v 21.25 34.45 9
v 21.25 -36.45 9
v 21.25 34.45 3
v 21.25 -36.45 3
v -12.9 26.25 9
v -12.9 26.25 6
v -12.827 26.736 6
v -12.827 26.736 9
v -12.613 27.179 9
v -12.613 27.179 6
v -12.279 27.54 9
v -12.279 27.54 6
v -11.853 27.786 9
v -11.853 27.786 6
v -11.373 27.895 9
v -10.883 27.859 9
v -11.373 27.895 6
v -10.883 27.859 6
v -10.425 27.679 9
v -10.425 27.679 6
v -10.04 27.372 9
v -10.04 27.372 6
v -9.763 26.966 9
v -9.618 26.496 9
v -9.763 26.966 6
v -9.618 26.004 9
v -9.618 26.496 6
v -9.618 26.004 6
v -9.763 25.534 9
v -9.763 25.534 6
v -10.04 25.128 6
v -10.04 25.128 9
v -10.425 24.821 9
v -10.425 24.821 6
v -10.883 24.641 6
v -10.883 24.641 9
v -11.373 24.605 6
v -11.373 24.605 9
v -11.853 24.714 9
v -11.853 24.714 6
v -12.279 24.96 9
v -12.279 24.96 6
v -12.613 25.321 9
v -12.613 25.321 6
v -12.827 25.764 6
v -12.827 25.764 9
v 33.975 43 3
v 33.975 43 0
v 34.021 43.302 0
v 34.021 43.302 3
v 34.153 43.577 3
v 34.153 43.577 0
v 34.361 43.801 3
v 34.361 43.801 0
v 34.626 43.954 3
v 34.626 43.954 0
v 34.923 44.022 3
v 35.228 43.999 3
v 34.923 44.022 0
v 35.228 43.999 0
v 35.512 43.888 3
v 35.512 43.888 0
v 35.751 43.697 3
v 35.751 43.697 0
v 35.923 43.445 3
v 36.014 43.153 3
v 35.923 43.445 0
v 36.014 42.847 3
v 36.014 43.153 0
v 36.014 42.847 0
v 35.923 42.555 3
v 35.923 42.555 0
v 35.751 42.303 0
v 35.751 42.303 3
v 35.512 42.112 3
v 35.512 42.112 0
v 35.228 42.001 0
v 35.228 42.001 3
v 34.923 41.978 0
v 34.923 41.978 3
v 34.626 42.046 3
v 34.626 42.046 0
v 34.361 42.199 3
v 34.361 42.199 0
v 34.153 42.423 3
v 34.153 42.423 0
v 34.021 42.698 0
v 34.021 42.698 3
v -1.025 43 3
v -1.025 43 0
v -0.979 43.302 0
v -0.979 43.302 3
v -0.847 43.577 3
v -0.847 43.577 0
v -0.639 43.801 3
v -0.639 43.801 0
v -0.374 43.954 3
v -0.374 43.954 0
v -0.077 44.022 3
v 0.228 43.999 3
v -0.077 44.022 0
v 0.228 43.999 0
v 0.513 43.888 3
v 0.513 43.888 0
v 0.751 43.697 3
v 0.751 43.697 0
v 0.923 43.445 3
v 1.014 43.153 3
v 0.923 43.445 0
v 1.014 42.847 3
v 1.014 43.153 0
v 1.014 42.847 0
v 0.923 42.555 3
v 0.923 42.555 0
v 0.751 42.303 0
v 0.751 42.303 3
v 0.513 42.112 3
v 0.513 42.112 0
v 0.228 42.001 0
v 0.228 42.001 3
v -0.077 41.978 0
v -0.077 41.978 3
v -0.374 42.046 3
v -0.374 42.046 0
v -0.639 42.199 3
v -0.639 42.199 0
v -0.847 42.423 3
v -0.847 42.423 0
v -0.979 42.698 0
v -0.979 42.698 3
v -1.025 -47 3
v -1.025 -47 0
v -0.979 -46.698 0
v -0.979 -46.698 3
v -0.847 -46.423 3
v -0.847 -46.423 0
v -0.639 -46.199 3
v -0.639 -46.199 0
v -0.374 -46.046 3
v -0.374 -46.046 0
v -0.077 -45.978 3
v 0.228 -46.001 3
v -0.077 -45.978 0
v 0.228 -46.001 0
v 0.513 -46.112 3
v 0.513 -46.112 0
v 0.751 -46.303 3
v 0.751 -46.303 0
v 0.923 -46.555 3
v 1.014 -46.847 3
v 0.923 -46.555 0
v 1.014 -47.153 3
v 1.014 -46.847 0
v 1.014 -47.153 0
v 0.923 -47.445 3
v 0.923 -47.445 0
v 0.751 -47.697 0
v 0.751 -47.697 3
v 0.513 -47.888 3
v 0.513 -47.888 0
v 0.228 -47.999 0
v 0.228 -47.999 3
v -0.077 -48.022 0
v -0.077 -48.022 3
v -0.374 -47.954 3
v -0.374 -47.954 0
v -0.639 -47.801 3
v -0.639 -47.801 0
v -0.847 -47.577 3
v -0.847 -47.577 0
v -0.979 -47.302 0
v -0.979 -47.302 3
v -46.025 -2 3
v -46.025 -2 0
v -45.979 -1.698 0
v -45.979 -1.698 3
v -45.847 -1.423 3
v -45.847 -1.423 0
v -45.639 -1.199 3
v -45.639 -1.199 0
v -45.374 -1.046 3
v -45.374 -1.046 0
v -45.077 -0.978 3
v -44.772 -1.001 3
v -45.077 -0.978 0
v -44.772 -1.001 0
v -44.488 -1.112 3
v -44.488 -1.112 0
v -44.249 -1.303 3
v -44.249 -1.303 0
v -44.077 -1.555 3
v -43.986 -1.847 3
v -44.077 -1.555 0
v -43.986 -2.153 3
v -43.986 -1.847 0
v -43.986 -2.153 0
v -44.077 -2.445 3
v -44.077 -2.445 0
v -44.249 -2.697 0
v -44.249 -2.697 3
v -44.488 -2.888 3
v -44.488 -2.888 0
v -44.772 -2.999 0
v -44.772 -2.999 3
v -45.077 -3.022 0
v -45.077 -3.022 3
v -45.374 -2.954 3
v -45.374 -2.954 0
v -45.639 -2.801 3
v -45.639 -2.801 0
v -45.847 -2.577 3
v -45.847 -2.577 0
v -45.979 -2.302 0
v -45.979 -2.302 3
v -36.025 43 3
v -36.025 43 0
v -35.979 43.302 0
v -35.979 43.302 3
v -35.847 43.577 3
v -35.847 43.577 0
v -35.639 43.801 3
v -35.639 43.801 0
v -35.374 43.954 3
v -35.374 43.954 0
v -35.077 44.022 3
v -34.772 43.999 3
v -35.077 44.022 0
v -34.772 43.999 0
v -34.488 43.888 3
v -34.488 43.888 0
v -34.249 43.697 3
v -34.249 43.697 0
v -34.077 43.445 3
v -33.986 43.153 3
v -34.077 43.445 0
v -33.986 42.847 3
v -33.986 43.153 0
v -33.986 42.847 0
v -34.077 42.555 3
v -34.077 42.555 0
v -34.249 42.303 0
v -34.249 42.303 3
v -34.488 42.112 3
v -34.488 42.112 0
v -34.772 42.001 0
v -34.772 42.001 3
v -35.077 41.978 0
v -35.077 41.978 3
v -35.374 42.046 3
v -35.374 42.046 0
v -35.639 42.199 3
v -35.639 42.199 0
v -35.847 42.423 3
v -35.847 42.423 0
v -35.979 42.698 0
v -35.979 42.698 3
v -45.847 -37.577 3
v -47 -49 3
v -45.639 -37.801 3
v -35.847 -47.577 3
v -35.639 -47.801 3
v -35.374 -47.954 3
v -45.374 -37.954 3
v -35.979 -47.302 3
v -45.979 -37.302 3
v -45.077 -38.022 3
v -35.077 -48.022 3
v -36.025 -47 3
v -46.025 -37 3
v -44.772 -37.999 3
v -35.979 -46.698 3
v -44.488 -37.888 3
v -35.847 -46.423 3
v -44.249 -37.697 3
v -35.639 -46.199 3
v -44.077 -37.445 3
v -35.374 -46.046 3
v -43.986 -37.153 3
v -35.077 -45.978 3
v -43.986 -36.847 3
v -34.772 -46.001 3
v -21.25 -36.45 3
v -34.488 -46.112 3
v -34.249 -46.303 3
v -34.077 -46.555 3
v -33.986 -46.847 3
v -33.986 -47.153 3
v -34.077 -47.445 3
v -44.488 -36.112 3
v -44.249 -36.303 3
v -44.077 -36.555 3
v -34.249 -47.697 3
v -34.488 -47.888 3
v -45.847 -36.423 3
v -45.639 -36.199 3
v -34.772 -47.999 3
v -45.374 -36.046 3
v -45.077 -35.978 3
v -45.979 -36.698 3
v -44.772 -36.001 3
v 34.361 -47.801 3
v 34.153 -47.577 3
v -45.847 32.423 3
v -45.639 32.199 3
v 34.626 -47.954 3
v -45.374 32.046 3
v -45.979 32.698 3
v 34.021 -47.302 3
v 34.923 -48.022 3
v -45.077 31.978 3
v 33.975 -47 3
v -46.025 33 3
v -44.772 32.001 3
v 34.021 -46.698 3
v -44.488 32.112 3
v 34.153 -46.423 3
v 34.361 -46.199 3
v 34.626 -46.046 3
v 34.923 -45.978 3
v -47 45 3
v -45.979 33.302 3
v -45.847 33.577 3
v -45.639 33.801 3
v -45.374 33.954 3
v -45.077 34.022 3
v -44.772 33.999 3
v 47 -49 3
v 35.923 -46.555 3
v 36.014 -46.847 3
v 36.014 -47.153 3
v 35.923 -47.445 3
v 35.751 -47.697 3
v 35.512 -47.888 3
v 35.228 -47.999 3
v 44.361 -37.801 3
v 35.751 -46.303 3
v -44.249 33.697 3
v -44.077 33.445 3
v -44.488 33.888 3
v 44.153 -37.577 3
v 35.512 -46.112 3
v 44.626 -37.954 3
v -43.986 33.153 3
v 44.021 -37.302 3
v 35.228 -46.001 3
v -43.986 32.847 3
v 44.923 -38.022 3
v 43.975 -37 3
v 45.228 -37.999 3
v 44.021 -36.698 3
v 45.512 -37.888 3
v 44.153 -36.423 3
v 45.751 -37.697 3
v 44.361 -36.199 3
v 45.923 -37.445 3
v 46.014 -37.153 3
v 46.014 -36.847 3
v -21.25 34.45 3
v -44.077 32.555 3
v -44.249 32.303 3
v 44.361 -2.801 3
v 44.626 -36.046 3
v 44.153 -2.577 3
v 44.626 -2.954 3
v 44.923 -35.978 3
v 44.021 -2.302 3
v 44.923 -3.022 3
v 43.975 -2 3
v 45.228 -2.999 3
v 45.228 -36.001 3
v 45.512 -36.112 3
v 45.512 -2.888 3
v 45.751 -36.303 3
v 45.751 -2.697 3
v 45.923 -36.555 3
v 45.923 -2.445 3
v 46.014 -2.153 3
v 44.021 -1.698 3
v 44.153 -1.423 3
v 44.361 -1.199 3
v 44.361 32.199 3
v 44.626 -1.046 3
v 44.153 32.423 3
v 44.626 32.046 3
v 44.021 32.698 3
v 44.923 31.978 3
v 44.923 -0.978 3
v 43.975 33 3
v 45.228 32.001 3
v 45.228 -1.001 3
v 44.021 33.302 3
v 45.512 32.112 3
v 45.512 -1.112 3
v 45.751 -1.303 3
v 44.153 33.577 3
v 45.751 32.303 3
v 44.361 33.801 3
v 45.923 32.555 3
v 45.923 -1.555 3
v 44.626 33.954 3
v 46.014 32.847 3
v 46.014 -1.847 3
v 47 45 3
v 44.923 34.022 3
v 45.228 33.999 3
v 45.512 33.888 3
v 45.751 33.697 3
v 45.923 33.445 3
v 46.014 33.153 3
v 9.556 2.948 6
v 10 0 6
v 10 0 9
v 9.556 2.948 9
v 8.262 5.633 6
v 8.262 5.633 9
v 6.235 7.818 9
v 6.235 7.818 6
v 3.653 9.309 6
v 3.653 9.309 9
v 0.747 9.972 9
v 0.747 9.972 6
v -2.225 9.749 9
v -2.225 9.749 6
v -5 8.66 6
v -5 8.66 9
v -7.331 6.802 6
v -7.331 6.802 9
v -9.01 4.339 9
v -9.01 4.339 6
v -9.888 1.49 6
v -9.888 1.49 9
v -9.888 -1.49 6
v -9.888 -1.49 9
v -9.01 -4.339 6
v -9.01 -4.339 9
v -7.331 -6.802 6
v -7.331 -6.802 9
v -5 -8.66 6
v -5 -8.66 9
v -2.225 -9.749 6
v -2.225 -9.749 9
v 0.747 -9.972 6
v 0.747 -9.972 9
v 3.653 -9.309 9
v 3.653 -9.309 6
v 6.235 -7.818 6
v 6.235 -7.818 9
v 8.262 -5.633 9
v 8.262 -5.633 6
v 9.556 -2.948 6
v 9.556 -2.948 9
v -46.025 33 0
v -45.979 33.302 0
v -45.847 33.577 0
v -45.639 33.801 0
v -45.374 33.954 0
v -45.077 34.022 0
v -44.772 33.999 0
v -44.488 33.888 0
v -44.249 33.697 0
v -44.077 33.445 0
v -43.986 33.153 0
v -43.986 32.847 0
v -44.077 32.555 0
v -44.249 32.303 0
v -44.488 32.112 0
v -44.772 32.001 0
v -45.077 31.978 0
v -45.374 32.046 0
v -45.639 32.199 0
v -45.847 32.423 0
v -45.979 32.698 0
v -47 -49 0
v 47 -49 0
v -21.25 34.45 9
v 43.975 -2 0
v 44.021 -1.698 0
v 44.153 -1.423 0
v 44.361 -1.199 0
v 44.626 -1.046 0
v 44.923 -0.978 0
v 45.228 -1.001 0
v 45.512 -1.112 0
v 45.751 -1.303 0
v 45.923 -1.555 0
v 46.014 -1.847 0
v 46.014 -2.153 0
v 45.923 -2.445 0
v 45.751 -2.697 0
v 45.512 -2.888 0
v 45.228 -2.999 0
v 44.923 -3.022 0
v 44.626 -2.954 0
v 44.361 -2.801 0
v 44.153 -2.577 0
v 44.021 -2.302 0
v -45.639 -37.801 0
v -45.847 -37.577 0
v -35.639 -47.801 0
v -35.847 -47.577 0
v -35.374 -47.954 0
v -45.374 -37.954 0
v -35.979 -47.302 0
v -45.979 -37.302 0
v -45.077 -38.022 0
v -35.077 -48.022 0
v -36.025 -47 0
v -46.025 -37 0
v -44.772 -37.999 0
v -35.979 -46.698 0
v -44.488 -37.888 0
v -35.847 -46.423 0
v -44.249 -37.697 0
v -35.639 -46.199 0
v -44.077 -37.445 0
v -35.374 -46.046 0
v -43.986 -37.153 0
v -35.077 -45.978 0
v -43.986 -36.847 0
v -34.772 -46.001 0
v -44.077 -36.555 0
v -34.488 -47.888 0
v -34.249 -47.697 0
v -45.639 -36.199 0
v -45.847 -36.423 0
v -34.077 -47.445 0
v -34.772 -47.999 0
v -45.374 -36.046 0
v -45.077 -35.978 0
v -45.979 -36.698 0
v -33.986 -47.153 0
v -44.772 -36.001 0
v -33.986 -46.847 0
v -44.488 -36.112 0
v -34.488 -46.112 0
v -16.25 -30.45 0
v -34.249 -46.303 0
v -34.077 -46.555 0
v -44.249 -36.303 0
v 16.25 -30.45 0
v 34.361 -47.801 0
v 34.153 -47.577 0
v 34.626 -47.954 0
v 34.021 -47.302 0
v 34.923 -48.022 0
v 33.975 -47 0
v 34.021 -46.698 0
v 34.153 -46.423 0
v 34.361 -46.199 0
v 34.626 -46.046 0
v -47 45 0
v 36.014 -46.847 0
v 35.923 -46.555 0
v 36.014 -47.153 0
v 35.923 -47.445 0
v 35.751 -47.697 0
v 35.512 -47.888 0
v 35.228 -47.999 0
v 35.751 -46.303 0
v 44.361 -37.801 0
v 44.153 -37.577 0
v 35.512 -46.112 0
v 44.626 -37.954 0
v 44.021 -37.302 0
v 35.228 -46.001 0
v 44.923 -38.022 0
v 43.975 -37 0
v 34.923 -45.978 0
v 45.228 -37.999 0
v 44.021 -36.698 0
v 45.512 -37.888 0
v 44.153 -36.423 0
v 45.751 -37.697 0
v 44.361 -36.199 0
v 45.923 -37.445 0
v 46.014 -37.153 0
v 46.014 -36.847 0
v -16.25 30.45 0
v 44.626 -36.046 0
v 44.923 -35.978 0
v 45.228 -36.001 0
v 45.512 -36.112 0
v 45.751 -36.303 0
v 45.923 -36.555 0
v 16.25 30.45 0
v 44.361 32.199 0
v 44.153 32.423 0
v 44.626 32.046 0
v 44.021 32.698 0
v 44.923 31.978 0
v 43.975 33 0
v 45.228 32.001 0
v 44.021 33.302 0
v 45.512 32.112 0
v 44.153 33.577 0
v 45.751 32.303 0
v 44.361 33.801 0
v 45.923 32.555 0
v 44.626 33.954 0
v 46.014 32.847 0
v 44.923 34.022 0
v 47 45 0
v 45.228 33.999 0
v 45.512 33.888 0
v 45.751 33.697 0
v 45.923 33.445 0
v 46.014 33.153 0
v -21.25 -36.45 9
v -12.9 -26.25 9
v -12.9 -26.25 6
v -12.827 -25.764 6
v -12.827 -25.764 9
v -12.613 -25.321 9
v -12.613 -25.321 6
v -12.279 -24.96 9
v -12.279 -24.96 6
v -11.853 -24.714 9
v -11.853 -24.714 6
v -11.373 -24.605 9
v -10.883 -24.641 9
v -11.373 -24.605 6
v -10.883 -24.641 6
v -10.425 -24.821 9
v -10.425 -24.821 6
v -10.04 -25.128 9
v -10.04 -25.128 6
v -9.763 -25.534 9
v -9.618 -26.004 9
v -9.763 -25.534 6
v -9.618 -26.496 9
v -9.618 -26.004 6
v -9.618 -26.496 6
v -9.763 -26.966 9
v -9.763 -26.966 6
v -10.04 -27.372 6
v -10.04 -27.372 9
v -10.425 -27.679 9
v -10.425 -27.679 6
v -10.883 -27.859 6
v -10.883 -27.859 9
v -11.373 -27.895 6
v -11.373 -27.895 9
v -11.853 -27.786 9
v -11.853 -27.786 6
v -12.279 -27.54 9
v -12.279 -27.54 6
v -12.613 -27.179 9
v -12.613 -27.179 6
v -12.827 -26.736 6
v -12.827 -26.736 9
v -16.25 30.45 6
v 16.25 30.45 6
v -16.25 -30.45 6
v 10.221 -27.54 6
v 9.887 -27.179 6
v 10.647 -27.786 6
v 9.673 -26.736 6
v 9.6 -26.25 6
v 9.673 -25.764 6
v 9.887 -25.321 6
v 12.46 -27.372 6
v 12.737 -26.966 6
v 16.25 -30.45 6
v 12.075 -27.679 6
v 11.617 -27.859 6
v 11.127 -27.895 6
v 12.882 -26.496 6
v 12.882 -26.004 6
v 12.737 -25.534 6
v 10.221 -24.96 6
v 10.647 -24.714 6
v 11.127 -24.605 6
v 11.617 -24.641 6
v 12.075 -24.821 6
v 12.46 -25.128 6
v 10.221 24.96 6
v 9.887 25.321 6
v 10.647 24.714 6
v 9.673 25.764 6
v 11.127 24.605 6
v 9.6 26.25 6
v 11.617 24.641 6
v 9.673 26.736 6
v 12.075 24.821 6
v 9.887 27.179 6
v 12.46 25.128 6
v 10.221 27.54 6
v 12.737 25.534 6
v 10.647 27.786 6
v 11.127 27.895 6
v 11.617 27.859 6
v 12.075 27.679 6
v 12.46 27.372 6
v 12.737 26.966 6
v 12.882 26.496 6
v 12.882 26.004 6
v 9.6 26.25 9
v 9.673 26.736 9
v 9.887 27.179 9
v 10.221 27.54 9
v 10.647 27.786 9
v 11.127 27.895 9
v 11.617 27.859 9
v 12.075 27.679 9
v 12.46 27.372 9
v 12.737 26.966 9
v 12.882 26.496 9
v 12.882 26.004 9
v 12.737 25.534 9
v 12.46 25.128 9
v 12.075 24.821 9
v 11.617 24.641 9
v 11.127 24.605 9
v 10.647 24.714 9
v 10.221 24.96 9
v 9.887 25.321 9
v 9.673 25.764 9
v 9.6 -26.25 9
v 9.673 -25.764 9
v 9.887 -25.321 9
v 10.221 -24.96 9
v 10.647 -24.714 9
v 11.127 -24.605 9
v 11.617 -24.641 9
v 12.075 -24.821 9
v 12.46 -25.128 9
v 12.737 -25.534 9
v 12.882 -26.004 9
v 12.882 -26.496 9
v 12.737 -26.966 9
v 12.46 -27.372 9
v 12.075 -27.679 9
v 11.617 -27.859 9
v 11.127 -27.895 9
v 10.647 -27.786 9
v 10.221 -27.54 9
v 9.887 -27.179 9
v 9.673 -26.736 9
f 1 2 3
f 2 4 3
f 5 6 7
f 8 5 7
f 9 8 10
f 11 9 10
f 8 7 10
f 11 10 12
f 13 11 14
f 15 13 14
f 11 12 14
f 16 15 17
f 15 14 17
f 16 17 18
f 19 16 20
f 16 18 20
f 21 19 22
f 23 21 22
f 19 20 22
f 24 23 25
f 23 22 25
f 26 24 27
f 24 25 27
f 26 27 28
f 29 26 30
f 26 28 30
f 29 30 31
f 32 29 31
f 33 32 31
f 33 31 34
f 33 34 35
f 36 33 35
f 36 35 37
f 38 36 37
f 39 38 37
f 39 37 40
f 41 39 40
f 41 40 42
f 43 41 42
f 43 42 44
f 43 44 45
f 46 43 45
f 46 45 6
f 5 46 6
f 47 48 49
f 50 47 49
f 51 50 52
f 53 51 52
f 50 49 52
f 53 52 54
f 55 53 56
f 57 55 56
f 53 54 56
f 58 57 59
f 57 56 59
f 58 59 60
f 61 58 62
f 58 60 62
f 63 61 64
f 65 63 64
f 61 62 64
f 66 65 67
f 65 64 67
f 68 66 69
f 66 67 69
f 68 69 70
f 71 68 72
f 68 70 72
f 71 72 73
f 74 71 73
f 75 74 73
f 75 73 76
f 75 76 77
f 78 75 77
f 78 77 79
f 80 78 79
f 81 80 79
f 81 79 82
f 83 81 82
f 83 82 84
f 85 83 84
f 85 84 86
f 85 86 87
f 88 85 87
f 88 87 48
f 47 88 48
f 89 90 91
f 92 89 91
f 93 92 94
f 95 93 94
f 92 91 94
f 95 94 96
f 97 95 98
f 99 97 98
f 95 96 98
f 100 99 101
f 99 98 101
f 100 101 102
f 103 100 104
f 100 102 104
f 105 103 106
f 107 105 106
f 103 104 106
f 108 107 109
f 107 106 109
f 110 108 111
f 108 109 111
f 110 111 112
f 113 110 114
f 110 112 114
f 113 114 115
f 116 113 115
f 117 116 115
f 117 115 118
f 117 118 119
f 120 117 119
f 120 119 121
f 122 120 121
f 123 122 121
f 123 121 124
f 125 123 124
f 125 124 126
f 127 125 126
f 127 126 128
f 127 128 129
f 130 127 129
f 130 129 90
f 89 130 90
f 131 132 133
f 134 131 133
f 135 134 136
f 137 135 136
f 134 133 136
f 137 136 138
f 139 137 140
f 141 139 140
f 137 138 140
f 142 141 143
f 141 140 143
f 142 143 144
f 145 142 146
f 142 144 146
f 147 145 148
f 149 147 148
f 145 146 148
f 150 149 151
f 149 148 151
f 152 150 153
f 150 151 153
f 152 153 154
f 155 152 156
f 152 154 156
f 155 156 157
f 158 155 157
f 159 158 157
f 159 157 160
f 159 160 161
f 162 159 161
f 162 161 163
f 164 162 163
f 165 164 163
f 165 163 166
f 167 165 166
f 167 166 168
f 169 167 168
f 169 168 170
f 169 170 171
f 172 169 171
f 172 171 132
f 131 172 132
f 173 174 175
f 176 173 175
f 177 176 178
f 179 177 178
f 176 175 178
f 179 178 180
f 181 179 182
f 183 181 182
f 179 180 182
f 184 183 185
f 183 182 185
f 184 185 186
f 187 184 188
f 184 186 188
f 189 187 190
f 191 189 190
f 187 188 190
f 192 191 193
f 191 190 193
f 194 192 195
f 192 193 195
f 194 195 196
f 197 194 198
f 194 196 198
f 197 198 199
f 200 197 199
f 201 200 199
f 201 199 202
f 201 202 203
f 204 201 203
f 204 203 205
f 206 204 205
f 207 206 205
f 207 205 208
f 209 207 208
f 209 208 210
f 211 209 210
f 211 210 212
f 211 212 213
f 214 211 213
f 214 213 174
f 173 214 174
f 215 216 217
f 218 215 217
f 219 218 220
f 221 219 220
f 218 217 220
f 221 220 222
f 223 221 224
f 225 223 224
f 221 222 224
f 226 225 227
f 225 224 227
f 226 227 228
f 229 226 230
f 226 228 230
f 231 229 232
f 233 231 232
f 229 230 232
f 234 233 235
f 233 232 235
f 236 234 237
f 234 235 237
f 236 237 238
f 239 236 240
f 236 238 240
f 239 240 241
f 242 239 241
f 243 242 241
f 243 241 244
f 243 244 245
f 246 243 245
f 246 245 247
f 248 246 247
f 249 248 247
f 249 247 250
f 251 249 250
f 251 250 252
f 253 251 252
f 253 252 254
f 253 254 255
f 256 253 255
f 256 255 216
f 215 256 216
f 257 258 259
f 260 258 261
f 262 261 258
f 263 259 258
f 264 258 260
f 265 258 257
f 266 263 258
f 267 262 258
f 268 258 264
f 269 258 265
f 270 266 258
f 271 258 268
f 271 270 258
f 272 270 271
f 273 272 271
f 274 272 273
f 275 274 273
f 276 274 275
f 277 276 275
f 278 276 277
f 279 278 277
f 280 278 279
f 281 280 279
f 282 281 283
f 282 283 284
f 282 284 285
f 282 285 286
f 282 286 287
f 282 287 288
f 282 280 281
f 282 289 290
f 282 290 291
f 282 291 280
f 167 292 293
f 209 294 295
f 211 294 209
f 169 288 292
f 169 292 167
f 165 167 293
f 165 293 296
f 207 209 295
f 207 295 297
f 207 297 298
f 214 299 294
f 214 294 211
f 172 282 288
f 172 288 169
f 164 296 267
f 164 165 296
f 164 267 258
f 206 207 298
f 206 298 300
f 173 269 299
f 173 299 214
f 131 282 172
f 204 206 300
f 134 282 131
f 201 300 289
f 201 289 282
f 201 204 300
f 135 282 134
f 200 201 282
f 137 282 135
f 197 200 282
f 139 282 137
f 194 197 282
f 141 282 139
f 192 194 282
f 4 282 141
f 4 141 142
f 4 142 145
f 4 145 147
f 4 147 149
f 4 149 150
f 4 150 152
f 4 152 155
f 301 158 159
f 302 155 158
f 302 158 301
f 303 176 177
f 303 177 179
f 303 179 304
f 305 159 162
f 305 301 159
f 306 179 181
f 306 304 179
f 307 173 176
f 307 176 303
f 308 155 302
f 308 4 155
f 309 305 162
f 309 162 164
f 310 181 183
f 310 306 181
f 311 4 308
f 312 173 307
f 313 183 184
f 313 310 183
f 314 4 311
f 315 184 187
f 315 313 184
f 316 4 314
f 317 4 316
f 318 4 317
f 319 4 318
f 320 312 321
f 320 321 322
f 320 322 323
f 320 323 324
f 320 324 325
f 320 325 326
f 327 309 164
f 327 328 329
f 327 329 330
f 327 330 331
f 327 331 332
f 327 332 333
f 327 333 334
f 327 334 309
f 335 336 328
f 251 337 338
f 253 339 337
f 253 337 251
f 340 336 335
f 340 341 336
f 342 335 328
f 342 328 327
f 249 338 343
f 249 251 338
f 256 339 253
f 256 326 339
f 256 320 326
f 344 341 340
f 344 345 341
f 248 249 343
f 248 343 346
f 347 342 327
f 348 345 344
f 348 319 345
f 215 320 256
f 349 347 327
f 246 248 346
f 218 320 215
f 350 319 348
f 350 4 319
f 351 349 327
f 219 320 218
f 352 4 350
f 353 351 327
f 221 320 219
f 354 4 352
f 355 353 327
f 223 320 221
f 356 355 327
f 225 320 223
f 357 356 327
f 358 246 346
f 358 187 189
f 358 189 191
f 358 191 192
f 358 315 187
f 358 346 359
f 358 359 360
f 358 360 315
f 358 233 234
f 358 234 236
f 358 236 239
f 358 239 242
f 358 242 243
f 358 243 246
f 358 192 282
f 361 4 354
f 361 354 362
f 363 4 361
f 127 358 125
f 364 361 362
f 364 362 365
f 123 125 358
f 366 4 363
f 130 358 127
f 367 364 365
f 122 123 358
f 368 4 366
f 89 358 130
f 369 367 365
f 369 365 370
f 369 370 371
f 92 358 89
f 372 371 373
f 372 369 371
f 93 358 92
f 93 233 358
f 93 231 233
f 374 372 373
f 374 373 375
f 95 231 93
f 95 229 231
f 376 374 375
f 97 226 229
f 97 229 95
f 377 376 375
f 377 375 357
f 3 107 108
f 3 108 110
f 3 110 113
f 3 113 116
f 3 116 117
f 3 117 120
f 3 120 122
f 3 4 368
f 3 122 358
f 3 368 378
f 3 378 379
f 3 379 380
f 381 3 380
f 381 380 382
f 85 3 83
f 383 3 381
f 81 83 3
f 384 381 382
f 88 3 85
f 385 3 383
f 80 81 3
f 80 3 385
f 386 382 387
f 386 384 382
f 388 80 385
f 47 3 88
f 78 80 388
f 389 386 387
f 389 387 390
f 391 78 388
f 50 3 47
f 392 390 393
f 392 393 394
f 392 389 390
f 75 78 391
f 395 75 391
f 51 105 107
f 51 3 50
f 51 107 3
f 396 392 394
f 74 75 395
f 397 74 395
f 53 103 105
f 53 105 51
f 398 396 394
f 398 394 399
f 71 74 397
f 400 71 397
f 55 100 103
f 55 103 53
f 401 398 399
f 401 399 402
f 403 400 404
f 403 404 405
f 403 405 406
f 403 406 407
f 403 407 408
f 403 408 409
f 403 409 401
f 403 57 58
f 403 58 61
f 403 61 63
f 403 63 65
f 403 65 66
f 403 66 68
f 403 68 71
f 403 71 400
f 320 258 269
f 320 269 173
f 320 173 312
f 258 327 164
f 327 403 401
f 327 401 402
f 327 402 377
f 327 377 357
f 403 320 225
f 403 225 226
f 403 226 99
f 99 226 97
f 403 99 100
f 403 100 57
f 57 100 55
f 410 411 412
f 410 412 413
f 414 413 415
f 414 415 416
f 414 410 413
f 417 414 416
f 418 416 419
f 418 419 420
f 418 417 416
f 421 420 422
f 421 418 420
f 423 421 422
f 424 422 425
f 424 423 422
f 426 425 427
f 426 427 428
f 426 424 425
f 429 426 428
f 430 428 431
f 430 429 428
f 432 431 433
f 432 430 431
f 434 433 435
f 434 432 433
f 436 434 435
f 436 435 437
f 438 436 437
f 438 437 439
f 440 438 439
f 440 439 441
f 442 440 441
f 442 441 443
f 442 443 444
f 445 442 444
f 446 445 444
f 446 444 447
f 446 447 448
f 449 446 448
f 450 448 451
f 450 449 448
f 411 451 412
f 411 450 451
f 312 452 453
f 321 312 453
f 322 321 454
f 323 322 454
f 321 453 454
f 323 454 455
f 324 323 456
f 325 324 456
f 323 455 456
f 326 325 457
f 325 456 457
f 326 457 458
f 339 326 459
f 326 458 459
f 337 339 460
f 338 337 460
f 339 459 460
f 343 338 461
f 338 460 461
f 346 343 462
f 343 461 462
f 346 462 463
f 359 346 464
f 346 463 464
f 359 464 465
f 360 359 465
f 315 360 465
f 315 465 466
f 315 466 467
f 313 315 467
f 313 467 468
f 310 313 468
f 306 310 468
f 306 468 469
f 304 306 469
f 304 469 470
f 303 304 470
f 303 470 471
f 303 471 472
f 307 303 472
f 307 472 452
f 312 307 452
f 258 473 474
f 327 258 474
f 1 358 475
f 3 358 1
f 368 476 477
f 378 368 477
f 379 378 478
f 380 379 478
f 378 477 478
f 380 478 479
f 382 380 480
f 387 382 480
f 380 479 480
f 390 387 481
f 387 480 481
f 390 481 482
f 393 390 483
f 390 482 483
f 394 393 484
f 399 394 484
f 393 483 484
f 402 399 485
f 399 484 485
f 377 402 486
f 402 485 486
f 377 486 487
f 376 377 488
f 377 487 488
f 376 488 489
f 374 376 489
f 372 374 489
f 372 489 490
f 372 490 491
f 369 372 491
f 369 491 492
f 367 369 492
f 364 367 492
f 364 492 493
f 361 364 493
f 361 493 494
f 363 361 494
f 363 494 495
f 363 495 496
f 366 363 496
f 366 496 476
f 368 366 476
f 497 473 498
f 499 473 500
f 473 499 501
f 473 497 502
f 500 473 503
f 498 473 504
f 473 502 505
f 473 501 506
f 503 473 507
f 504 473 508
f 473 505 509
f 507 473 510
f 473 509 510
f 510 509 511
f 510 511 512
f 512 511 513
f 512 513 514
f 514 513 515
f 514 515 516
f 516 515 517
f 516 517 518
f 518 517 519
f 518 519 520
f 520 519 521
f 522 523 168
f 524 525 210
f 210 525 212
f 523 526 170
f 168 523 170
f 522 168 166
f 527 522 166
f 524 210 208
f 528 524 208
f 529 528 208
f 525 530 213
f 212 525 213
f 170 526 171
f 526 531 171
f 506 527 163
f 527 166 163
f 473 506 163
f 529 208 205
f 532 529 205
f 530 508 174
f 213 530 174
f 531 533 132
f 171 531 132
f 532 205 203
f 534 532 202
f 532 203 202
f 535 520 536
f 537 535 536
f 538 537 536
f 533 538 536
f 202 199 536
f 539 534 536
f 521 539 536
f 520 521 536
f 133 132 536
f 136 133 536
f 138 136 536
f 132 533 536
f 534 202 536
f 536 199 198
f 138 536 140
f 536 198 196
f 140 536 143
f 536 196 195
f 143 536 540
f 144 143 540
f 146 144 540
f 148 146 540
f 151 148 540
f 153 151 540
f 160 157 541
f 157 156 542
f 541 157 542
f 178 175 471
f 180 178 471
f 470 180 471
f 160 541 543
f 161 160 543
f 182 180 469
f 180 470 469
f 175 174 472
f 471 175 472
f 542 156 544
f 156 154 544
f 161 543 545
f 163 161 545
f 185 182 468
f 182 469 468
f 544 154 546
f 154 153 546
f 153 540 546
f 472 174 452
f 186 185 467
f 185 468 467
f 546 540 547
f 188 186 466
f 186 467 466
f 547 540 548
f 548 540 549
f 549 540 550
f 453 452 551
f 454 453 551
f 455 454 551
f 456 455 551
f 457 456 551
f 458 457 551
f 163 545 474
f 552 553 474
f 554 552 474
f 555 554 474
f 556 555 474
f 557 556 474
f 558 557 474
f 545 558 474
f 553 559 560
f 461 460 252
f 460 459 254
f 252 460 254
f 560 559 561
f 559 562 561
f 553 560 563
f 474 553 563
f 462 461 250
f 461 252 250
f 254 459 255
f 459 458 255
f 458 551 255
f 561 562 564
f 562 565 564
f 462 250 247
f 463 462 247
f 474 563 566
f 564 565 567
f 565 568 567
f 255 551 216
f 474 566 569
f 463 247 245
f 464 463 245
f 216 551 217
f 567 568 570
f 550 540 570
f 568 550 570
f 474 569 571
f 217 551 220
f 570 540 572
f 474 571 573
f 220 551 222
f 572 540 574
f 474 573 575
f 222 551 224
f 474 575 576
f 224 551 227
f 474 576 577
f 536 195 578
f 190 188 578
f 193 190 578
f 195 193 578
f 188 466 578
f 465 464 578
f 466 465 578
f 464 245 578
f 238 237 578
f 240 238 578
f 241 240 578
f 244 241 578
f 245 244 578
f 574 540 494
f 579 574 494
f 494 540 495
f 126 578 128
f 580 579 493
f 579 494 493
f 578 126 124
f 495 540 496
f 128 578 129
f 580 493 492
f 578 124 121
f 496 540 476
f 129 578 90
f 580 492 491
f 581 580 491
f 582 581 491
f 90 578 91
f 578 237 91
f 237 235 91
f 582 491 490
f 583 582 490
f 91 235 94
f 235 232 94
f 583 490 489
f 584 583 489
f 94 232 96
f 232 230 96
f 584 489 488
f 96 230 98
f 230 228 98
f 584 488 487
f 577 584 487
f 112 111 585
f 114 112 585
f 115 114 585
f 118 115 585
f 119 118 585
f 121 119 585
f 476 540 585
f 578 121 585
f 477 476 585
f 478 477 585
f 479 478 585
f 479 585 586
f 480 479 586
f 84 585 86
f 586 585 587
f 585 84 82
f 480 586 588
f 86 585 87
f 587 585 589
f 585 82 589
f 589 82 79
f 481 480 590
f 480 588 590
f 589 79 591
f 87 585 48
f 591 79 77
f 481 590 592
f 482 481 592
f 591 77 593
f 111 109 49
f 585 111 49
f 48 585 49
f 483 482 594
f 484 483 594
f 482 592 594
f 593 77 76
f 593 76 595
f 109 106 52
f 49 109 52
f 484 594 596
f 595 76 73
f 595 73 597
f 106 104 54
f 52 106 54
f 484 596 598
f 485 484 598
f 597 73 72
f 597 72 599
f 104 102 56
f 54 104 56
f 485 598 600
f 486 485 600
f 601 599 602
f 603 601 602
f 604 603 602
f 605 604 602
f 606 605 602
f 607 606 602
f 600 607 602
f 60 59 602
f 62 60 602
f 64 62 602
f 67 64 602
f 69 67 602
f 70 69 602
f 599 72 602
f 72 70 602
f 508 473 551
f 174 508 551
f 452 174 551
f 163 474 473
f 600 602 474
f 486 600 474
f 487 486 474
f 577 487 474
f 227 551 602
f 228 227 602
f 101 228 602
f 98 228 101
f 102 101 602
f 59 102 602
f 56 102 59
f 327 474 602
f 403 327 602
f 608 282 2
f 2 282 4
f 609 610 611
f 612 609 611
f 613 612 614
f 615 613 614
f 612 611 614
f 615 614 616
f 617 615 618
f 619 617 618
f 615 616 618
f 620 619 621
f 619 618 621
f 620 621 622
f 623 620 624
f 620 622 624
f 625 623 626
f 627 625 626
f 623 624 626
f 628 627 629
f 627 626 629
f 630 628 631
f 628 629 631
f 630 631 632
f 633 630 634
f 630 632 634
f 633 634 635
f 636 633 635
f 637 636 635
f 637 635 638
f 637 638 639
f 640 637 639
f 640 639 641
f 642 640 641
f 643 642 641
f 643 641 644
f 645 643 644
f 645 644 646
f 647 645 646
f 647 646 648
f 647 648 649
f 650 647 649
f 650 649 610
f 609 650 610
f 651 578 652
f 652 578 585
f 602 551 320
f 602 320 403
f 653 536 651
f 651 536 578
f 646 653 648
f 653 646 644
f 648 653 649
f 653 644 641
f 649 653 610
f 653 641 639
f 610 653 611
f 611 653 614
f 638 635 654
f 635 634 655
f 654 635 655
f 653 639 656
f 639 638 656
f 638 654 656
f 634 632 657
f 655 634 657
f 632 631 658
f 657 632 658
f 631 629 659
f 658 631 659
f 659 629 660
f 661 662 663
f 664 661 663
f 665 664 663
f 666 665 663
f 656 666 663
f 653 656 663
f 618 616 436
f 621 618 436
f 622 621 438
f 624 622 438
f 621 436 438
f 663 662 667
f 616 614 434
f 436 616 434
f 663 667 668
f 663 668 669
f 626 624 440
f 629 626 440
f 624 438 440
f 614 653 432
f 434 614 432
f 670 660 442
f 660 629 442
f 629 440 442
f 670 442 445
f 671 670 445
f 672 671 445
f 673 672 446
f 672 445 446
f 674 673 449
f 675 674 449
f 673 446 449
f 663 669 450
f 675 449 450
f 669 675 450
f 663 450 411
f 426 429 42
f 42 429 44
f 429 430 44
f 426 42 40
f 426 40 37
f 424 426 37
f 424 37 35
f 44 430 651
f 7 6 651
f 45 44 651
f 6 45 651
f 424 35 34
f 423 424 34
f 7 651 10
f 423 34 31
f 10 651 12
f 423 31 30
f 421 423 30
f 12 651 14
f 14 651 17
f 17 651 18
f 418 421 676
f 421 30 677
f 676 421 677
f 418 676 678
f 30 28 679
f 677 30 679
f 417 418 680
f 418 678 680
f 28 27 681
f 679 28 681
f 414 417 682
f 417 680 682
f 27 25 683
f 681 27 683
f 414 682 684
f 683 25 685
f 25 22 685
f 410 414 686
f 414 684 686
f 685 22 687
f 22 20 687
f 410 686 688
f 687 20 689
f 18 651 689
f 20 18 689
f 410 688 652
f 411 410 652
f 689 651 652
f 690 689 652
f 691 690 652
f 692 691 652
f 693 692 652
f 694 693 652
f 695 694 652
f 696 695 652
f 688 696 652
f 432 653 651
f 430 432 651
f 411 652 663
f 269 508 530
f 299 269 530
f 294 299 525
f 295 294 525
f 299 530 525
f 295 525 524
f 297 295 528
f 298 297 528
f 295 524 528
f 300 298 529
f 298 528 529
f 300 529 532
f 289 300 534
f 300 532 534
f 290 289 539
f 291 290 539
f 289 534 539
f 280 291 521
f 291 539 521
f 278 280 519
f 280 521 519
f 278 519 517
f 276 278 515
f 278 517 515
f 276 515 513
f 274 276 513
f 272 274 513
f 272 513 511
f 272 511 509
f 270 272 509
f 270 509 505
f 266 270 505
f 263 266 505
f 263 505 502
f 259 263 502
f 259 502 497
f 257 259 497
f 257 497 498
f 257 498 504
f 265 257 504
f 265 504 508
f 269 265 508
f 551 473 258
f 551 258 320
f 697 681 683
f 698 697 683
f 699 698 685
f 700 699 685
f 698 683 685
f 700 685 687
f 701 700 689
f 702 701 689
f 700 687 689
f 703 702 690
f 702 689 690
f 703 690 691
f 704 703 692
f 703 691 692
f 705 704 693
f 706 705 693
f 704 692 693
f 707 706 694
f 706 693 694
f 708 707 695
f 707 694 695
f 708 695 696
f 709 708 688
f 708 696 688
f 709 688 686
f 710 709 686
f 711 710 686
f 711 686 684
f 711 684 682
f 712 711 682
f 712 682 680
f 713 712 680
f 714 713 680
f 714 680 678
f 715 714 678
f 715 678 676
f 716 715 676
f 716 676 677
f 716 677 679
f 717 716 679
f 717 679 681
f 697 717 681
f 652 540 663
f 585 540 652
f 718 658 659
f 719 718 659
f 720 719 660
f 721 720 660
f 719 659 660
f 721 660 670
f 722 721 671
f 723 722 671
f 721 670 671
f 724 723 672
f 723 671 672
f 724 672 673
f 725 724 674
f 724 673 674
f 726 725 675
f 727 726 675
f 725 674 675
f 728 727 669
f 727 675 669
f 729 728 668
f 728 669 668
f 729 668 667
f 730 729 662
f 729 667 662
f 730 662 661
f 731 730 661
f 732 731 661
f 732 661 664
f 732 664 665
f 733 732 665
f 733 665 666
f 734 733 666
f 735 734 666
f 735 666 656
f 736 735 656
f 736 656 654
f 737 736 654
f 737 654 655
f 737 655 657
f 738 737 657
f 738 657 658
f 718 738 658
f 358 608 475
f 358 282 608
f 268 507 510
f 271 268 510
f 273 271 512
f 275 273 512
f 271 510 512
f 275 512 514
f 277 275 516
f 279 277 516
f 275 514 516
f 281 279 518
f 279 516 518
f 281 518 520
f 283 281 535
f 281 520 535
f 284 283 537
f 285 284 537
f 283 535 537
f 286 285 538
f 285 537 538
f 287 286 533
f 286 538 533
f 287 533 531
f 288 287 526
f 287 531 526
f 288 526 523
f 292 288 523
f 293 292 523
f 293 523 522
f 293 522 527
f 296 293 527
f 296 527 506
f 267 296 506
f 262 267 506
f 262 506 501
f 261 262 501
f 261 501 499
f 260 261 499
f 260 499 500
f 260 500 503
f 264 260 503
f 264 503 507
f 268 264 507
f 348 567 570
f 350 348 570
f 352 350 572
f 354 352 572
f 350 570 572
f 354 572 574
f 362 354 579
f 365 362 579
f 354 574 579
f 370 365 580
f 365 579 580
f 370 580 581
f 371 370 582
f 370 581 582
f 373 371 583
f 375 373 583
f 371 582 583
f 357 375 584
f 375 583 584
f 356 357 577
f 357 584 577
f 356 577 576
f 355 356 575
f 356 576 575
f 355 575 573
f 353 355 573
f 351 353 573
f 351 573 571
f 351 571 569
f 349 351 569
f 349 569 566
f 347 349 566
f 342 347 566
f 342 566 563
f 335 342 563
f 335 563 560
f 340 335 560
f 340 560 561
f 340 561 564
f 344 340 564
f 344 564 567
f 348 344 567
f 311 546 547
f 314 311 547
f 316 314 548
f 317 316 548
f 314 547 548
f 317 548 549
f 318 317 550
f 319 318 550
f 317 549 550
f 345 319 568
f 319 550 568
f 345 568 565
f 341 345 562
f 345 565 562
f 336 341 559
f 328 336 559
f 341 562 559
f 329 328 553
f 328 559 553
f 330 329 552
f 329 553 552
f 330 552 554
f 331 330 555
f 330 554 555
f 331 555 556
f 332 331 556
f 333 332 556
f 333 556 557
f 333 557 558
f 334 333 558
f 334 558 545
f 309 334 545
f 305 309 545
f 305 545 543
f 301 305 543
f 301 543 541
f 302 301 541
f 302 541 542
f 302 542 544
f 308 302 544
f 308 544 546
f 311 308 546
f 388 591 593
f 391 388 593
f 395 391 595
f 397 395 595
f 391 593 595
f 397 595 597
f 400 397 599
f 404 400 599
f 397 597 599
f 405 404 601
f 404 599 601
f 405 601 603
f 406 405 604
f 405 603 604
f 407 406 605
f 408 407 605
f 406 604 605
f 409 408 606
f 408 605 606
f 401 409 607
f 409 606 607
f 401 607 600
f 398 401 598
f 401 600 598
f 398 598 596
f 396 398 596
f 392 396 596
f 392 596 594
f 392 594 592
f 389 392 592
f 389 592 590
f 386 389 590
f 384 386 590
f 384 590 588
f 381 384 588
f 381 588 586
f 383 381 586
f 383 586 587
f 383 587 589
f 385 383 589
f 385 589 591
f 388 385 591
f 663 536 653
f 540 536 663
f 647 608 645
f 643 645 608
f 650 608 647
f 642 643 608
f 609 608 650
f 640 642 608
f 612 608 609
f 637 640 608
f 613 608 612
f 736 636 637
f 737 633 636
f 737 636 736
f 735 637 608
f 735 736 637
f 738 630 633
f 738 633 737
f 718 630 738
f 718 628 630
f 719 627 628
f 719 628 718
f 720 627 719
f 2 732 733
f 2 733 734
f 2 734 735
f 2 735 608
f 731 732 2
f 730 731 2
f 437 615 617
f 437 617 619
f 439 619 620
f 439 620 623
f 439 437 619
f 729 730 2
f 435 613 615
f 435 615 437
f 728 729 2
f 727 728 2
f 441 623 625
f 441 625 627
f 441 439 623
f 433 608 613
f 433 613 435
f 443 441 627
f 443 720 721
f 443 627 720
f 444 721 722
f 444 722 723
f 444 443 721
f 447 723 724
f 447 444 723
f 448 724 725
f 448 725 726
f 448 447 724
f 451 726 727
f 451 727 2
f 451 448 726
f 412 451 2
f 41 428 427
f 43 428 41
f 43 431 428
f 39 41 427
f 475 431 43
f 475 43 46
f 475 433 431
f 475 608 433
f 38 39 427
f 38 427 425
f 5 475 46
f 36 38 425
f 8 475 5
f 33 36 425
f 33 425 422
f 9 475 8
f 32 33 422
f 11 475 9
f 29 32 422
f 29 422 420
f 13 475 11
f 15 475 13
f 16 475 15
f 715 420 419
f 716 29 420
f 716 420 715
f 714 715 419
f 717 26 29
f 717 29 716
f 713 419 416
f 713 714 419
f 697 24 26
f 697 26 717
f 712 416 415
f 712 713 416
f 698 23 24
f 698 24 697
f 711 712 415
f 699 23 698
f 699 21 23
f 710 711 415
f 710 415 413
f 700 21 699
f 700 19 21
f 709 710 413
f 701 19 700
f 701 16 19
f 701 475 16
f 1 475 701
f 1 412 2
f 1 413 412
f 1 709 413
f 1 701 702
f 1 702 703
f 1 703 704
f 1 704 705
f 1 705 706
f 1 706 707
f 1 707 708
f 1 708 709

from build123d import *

# Parameters (mm, degrees)
SKETCH_1_W               = 94
SKETCH_1_H               = 94
SKETCH_1_W_2             = 42.5
SKETCH_1_H_2             = 70.9
EXTRUDE_1_DEPTH          = 3
SKETCH_1_5_W             = 42.5
SKETCH_1_5_H             = 70.9
SKETCH_1_5_W_2           = 32.5
SKETCH_1_5_H_2           = 60.9
EXTRUDE_2_DEPTH          = 6
SKETCH_2_W               = 42.5
SKETCH_2_H               = 70.9
SKETCH_2_R               = 10
EXTRUDE_3_DEPTH          = 3
HOLE_WIZARD_M4_1_D       = 3.3
HOLE_WIZARD_M4_1_DEPTH   = 11.5
HOLE_WIZARD_M4_1_TIP     = 0.991420021
HOLE_WIZARD_M2_5_1_D     = 2.05
HOLE_WIZARD_M2_5_1_DEPTH = 7.25
HOLE_WIZARD_M2_5_1_TIP   = 0.615882135
HOLE_WIZARD_M2_5_2_D     = 2.05
HOLE_WIZARD_M2_5_2_DEPTH = 7.25
HOLE_WIZARD_M2_5_2_TIP   = 0.615882135


with BuildPart() as part:
    # 草图1 → 凸台-拉伸1 (new body)
    with BuildSketch(Plane.XY):
        with Locations((0, -2)):
            Rectangle(SKETCH_1_W, SKETCH_1_H)
        with Locations((0, -1)):
            Rectangle(SKETCH_1_W_2, SKETCH_1_H_2, mode=Mode.SUBTRACT)
    extrude(amount=EXTRUDE_1_DEPTH)

    # 草图1<5> → 凸台-拉伸2 (add)
    with BuildSketch(Plane.XY):
        with Locations((0, -1)):
            Rectangle(SKETCH_1_5_W, SKETCH_1_5_H)
        Rectangle(SKETCH_1_5_W_2, SKETCH_1_5_H_2, mode=Mode.SUBTRACT)
    extrude(amount=EXTRUDE_2_DEPTH)

    # 草图2 → 凸台-拉伸3 (add)
    with BuildSketch(Plane.XY.offset(6)):
        with Locations((0, -1)):
            Rectangle(SKETCH_2_W, SKETCH_2_H)
        Circle(SKETCH_2_R, mode=Mode.SUBTRACT)
    extrude(amount=EXTRUDE_3_DEPTH)

    # M4 螺纹孔1
    with Locations(Plane.XY.offset(9)):
        with Locations((11.25, 26.25), (-11.25, 26.25), (-11.25, -26.25), (11.25, -26.25)):
            Hole(HOLE_WIZARD_M4_1_D / 2, depth=HOLE_WIZARD_M4_1_DEPTH)
            with Locations((0, 0, -(HOLE_WIZARD_M4_1_DEPTH + HOLE_WIZARD_M4_1_TIP / 2))):  # 118° drill point
                Cone(0, HOLE_WIZARD_M4_1_D / 2, HOLE_WIZARD_M4_1_TIP, mode=Mode.SUBTRACT)

    # M2.5 螺纹孔1
    with Locations(Plane.XY.offset(3)):
        with Locations((-45, 33), (-45, -2), (-45, -37), (-35, 43), (0, 43), (35, 43), (45, 33)):
            Hole(HOLE_WIZARD_M2_5_1_D / 2, depth=HOLE_WIZARD_M2_5_1_DEPTH)
            with Locations((0, 0, -(HOLE_WIZARD_M2_5_1_DEPTH + HOLE_WIZARD_M2_5_1_TIP / 2))):  # 118° drill point
                Cone(0, HOLE_WIZARD_M2_5_1_D / 2, HOLE_WIZARD_M2_5_1_TIP, mode=Mode.SUBTRACT)

    # M2.5 螺纹孔2
    with Locations(Plane.XY.offset(3)):
        with Locations((45, -2), (45, -37), (35, -47), (0, -47), (-35, -47)):
            Hole(HOLE_WIZARD_M2_5_2_D / 2, depth=HOLE_WIZARD_M2_5_2_DEPTH)
            with Locations((0, 0, -(HOLE_WIZARD_M2_5_2_DEPTH + HOLE_WIZARD_M2_5_2_TIP / 2))):  # 118° drill point
                Cone(0, HOLE_WIZARD_M2_5_2_D / 2, HOLE_WIZARD_M2_5_2_TIP, mode=Mode.SUBTRACT)


solid = part.part
